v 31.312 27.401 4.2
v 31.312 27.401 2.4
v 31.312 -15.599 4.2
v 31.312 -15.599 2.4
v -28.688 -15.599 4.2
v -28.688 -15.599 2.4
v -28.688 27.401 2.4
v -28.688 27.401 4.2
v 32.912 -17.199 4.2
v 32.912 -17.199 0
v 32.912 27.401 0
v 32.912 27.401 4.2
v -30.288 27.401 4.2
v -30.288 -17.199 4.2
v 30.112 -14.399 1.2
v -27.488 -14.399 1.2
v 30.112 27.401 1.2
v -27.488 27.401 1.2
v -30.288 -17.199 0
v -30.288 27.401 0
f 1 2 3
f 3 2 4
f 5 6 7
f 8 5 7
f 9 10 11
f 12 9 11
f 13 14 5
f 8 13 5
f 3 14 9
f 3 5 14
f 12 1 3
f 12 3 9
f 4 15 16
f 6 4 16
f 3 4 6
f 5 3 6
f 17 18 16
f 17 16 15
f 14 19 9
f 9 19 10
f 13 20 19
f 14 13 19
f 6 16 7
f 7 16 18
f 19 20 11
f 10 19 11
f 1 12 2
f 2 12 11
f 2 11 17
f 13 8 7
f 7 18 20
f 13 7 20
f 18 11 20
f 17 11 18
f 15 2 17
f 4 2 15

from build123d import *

# Parameters (mm, degrees)
F1_DEPTH = 4.2
F0_W     = 60
F0_H     = 43
F2_DEPTH = 1.2
F3_SIZE  = 1.2


with BuildPart() as f1:
    # F0 (on Top) → F1 (new body)
    with BuildSketch(Plane.XY):
        Polygon((-28.6880440414, 27.4013292328), (-30.2880440414, 27.4013292328), (-30.2880440414, -17.1986707672), (32.9119559586, -17.1986707672), (32.9119559586, 27.4013292328), (31.3119559586, 27.4013292328), (31.3119559586, -15.5986707672), (-28.6880440414, -15.5986707672), align=None)
    extrude(amount=F1_DEPTH)

    # F0 (on Top) → F2 (join)
    with BuildSketch(Plane.XY):
        Polygon((-28.6880440414, 27.4013292328), (-30.2880440414, 27.4013292328), (-30.2880440414, -17.1986707672), (32.9119559586, -17.1986707672), (32.9119559586, 27.4013292328), (31.3119559586, 27.4013292328), (31.3119559586, -15.5986707672), (-28.6880440414, -15.5986707672), align=None)
        with Locations((1.3119559586, 5.9013292328)):
            Rectangle(F0_W, F0_H)
    extrude(amount=F2_DEPTH)

    # F3
    f3_edges = [f1.edges().sort_by_distance(p)[0] for p in [
        (-28.688044, 5.901329, 1.2),
        (1.311956, -15.598671, 1.2),
        (31.311956, 5.901329, 1.2),
    ]]
    chamfer(f3_edges, length=F3_SIZE)


solid = f1.part
